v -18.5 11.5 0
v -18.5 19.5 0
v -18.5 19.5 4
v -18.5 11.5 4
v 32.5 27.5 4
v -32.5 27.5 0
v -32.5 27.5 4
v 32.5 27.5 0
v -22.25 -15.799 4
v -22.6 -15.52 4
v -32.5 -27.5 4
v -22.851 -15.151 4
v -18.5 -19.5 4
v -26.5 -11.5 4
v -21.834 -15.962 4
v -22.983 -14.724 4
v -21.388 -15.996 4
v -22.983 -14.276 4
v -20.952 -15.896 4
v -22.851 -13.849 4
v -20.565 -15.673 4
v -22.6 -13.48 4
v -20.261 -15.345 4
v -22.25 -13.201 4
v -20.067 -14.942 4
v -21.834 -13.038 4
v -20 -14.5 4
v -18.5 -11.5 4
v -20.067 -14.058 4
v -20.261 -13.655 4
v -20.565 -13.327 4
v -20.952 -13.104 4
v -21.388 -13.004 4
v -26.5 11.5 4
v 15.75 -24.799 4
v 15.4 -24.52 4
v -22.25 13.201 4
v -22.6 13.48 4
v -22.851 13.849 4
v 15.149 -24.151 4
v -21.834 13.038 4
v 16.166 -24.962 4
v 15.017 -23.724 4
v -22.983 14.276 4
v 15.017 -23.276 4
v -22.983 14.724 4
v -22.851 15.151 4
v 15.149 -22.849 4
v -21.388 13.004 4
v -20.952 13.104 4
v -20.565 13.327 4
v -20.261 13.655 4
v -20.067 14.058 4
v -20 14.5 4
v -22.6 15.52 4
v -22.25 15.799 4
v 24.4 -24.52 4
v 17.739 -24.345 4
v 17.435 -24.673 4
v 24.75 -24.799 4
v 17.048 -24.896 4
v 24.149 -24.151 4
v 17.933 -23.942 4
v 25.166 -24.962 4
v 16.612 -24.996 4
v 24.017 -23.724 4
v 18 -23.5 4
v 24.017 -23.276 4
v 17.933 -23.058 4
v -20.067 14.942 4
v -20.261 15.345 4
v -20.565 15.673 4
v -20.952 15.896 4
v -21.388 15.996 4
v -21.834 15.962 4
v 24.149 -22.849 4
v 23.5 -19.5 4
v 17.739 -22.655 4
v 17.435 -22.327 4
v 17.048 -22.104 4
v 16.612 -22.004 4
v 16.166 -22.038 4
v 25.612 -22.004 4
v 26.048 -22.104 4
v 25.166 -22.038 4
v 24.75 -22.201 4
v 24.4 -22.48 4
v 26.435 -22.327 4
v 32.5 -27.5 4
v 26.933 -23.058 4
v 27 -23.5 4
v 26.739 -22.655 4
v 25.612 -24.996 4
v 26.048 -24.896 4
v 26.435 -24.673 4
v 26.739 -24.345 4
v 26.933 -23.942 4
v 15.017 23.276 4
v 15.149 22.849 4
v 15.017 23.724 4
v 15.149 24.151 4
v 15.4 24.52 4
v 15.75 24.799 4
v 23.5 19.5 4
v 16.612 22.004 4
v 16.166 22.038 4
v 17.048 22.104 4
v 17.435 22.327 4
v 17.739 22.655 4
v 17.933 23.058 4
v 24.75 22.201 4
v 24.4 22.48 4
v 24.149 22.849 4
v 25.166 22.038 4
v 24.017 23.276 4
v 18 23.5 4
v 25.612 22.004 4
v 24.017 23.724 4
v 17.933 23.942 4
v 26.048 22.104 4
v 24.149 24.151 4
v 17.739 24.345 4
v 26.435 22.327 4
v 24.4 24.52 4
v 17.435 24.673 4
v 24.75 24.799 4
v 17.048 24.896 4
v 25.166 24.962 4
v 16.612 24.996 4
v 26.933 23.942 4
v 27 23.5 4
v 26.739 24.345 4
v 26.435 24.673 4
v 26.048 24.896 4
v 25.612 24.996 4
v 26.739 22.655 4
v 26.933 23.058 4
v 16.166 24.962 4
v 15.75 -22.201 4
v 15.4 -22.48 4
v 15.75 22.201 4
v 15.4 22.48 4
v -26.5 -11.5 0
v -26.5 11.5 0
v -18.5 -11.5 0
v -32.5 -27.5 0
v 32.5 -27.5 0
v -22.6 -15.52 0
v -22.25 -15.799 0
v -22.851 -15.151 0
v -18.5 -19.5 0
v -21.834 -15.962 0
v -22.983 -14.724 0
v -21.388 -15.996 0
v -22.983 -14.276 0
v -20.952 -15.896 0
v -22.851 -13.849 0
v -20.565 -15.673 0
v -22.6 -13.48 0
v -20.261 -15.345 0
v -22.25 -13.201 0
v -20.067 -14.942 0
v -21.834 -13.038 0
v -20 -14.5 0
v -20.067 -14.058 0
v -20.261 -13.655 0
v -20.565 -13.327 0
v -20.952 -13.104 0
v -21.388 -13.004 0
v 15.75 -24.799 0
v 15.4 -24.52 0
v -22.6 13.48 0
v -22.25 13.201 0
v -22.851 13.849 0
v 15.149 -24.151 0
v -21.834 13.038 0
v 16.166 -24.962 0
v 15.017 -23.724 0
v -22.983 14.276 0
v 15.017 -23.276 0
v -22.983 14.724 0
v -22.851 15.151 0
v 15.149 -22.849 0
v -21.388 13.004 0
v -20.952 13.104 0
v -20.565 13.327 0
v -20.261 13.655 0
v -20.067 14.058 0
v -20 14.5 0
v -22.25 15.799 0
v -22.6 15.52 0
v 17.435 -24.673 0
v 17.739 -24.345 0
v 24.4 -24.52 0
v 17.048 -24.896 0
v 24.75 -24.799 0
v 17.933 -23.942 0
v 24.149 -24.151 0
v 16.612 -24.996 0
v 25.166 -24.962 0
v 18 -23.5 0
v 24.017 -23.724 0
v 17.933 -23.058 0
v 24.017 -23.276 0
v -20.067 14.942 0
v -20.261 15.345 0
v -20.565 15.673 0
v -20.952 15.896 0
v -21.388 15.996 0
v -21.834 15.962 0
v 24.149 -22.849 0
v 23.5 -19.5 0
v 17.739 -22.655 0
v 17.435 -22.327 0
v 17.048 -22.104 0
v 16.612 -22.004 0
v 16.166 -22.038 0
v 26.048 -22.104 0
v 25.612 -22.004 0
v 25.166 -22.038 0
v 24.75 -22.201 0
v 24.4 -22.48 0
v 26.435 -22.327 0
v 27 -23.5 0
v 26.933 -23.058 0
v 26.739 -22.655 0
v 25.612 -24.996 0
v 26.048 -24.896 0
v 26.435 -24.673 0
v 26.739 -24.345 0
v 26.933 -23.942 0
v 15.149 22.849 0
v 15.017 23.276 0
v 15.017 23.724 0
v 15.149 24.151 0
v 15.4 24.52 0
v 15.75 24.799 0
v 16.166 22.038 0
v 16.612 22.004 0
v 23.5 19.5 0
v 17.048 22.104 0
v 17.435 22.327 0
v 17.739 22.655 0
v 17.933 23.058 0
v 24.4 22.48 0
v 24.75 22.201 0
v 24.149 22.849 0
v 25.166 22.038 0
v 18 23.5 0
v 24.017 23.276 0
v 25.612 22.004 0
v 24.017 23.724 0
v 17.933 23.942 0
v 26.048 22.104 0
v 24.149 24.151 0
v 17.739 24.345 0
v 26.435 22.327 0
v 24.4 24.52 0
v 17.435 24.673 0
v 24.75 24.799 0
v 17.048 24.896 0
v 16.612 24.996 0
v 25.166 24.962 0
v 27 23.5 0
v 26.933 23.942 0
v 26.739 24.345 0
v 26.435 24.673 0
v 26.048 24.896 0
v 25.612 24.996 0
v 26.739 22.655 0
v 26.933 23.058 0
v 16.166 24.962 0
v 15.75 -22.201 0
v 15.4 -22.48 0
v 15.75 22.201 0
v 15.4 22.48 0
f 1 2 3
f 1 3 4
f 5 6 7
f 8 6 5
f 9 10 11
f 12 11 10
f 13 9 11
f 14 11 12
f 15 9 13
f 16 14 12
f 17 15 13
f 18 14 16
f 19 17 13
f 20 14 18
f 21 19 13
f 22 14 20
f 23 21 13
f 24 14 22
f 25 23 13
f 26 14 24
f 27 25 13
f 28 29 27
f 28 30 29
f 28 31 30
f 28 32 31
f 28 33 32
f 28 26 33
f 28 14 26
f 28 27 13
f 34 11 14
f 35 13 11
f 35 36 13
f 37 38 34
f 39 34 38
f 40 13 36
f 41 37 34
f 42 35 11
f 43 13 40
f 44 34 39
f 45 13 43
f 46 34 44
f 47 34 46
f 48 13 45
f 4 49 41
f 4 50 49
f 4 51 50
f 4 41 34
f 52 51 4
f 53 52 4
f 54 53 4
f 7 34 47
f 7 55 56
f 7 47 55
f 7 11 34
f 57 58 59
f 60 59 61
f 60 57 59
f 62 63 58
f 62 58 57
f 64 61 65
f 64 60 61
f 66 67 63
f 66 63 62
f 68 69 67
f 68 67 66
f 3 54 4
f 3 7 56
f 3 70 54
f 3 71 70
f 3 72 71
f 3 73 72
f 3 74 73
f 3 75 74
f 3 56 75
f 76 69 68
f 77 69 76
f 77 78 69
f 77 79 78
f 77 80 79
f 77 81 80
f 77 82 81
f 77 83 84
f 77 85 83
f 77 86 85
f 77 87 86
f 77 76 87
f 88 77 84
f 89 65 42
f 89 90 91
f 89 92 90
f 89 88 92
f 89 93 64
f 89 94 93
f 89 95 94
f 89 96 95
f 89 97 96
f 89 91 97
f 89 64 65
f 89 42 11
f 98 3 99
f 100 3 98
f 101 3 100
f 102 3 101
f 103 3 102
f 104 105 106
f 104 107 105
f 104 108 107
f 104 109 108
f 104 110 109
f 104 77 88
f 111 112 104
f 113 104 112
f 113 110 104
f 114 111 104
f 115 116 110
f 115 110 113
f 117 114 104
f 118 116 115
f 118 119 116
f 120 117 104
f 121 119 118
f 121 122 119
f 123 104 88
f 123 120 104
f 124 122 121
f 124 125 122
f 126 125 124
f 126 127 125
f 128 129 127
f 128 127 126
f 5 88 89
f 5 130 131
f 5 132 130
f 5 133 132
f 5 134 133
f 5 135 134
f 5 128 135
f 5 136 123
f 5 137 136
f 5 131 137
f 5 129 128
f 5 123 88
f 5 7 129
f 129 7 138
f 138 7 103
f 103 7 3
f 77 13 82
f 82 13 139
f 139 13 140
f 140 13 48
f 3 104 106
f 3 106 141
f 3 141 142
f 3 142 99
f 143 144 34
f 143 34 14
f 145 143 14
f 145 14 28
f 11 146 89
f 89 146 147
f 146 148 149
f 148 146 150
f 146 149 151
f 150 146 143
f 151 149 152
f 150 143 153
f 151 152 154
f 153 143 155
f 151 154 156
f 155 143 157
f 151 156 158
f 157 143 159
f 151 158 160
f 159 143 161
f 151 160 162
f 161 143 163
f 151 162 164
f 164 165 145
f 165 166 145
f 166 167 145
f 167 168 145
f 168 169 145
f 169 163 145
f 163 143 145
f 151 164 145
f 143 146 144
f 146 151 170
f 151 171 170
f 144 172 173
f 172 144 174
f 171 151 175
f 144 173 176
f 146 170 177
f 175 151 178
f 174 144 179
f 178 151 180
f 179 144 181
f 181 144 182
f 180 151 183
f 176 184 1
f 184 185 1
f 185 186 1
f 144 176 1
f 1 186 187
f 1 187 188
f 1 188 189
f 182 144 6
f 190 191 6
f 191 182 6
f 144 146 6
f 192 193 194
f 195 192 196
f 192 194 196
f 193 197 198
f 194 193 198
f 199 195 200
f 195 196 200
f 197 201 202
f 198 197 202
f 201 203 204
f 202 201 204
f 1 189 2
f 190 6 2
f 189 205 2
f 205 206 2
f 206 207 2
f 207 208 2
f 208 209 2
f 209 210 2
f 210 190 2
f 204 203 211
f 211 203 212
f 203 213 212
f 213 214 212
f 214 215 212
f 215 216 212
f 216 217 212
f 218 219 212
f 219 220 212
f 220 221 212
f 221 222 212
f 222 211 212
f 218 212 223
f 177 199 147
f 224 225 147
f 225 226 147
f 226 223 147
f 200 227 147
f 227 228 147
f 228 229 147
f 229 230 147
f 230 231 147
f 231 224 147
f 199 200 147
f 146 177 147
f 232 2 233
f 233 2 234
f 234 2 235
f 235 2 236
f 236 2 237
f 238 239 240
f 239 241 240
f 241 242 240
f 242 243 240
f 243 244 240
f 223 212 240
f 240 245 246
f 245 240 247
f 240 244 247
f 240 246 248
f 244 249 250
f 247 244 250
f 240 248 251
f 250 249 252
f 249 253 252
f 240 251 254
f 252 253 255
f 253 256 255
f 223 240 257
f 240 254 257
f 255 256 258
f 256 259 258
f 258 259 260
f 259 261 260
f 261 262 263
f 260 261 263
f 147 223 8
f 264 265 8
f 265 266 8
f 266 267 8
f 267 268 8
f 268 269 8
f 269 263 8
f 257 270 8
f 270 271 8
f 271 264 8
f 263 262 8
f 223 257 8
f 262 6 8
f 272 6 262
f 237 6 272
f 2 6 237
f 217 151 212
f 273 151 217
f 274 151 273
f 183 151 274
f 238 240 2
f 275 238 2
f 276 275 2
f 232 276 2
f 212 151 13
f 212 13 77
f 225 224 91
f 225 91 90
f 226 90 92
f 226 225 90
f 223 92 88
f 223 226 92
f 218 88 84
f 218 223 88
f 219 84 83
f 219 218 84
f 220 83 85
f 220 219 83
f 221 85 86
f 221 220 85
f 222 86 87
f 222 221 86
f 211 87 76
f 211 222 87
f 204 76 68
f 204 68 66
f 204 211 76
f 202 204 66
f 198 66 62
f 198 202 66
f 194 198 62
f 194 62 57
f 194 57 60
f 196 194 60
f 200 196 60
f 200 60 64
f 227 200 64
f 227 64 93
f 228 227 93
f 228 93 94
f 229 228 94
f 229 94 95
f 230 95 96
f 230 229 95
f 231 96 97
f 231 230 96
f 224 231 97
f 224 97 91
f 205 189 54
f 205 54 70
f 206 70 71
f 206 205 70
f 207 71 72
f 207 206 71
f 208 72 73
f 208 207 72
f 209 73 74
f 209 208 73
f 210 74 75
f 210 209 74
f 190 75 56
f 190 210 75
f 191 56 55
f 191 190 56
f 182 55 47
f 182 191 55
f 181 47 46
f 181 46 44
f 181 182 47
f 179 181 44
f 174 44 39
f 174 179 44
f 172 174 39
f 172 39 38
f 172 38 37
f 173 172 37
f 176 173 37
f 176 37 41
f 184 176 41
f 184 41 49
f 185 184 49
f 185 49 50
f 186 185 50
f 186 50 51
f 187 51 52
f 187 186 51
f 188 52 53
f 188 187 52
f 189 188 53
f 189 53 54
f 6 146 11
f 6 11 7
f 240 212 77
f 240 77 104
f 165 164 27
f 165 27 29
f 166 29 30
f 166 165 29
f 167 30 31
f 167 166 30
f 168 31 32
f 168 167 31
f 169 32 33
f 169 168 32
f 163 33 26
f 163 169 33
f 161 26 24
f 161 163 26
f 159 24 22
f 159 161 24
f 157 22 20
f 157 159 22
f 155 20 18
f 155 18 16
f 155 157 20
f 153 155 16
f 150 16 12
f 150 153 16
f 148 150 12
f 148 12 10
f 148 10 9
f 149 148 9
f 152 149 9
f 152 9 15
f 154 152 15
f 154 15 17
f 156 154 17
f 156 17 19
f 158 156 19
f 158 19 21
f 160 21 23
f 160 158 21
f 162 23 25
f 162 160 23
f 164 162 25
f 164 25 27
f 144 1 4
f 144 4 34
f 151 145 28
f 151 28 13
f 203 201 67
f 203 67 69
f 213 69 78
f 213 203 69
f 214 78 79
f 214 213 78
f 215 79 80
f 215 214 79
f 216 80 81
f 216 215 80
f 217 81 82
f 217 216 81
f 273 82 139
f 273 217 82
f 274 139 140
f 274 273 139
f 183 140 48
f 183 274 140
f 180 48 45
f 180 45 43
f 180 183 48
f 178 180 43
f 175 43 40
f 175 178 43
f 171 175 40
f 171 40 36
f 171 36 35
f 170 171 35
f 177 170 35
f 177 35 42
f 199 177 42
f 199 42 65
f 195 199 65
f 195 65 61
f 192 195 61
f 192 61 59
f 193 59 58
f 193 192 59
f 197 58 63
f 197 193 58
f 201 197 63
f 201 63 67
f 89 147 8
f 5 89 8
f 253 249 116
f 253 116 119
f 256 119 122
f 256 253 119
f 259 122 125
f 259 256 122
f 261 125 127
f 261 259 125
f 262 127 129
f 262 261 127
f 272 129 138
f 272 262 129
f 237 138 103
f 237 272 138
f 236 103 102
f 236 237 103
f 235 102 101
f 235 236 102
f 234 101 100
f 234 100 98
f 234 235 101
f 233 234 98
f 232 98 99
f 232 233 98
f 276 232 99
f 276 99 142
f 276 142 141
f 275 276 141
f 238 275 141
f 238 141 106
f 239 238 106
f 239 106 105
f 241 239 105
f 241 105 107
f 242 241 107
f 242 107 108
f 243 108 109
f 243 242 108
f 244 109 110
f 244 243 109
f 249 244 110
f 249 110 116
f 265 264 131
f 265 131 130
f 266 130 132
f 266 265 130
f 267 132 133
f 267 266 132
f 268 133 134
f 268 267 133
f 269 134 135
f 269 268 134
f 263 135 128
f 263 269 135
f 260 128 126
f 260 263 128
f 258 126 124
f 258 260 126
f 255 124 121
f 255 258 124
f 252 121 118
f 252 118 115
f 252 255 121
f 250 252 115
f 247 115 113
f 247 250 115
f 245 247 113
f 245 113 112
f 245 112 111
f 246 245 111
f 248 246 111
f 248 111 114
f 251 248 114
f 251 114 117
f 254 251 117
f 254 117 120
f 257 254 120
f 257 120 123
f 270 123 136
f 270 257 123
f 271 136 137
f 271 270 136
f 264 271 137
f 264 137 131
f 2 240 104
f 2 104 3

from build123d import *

# Parameters (mm, degrees)
SKETCH_1_W      = 65
SKETCH_1_H      = 55
SKETCH_1_R      = 1.5
EXTRUDE_1_DEPTH = 4


with BuildPart() as part:
    # 草图1 → 凸台-拉伸1 (new body)
    with BuildSketch(Plane.XY):
        Rectangle(SKETCH_1_W, SKETCH_1_H)
        with Locations((-21.5, 14.5)):
            Circle(SKETCH_1_R, mode=Mode.SUBTRACT)
        with Locations((-21.5, -14.5)):
            Circle(SKETCH_1_R, mode=Mode.SUBTRACT)
        with Locations((16.5, 23.5)):
            Circle(SKETCH_1_R, mode=Mode.SUBTRACT)
        with Locations((25.5, 23.5)):
            Circle(SKETCH_1_R, mode=Mode.SUBTRACT)
        with Locations((16.5, -23.5)):
            Circle(SKETCH_1_R, mode=Mode.SUBTRACT)
        with Locations((25.5, -23.5)):
            Circle(SKETCH_1_R, mode=Mode.SUBTRACT)
        Polygon((23.5, -19.5), (23.5, 19.5), (-18.5, 19.5), (-18.5, 11.5), (-26.5, 11.5), (-26.5, -11.5), (-18.5, -11.5), (-18.5, -19.5), align=None, mode=Mode.SUBTRACT)
    extrude(amount=EXTRUDE_1_DEPTH)


solid = part.part
